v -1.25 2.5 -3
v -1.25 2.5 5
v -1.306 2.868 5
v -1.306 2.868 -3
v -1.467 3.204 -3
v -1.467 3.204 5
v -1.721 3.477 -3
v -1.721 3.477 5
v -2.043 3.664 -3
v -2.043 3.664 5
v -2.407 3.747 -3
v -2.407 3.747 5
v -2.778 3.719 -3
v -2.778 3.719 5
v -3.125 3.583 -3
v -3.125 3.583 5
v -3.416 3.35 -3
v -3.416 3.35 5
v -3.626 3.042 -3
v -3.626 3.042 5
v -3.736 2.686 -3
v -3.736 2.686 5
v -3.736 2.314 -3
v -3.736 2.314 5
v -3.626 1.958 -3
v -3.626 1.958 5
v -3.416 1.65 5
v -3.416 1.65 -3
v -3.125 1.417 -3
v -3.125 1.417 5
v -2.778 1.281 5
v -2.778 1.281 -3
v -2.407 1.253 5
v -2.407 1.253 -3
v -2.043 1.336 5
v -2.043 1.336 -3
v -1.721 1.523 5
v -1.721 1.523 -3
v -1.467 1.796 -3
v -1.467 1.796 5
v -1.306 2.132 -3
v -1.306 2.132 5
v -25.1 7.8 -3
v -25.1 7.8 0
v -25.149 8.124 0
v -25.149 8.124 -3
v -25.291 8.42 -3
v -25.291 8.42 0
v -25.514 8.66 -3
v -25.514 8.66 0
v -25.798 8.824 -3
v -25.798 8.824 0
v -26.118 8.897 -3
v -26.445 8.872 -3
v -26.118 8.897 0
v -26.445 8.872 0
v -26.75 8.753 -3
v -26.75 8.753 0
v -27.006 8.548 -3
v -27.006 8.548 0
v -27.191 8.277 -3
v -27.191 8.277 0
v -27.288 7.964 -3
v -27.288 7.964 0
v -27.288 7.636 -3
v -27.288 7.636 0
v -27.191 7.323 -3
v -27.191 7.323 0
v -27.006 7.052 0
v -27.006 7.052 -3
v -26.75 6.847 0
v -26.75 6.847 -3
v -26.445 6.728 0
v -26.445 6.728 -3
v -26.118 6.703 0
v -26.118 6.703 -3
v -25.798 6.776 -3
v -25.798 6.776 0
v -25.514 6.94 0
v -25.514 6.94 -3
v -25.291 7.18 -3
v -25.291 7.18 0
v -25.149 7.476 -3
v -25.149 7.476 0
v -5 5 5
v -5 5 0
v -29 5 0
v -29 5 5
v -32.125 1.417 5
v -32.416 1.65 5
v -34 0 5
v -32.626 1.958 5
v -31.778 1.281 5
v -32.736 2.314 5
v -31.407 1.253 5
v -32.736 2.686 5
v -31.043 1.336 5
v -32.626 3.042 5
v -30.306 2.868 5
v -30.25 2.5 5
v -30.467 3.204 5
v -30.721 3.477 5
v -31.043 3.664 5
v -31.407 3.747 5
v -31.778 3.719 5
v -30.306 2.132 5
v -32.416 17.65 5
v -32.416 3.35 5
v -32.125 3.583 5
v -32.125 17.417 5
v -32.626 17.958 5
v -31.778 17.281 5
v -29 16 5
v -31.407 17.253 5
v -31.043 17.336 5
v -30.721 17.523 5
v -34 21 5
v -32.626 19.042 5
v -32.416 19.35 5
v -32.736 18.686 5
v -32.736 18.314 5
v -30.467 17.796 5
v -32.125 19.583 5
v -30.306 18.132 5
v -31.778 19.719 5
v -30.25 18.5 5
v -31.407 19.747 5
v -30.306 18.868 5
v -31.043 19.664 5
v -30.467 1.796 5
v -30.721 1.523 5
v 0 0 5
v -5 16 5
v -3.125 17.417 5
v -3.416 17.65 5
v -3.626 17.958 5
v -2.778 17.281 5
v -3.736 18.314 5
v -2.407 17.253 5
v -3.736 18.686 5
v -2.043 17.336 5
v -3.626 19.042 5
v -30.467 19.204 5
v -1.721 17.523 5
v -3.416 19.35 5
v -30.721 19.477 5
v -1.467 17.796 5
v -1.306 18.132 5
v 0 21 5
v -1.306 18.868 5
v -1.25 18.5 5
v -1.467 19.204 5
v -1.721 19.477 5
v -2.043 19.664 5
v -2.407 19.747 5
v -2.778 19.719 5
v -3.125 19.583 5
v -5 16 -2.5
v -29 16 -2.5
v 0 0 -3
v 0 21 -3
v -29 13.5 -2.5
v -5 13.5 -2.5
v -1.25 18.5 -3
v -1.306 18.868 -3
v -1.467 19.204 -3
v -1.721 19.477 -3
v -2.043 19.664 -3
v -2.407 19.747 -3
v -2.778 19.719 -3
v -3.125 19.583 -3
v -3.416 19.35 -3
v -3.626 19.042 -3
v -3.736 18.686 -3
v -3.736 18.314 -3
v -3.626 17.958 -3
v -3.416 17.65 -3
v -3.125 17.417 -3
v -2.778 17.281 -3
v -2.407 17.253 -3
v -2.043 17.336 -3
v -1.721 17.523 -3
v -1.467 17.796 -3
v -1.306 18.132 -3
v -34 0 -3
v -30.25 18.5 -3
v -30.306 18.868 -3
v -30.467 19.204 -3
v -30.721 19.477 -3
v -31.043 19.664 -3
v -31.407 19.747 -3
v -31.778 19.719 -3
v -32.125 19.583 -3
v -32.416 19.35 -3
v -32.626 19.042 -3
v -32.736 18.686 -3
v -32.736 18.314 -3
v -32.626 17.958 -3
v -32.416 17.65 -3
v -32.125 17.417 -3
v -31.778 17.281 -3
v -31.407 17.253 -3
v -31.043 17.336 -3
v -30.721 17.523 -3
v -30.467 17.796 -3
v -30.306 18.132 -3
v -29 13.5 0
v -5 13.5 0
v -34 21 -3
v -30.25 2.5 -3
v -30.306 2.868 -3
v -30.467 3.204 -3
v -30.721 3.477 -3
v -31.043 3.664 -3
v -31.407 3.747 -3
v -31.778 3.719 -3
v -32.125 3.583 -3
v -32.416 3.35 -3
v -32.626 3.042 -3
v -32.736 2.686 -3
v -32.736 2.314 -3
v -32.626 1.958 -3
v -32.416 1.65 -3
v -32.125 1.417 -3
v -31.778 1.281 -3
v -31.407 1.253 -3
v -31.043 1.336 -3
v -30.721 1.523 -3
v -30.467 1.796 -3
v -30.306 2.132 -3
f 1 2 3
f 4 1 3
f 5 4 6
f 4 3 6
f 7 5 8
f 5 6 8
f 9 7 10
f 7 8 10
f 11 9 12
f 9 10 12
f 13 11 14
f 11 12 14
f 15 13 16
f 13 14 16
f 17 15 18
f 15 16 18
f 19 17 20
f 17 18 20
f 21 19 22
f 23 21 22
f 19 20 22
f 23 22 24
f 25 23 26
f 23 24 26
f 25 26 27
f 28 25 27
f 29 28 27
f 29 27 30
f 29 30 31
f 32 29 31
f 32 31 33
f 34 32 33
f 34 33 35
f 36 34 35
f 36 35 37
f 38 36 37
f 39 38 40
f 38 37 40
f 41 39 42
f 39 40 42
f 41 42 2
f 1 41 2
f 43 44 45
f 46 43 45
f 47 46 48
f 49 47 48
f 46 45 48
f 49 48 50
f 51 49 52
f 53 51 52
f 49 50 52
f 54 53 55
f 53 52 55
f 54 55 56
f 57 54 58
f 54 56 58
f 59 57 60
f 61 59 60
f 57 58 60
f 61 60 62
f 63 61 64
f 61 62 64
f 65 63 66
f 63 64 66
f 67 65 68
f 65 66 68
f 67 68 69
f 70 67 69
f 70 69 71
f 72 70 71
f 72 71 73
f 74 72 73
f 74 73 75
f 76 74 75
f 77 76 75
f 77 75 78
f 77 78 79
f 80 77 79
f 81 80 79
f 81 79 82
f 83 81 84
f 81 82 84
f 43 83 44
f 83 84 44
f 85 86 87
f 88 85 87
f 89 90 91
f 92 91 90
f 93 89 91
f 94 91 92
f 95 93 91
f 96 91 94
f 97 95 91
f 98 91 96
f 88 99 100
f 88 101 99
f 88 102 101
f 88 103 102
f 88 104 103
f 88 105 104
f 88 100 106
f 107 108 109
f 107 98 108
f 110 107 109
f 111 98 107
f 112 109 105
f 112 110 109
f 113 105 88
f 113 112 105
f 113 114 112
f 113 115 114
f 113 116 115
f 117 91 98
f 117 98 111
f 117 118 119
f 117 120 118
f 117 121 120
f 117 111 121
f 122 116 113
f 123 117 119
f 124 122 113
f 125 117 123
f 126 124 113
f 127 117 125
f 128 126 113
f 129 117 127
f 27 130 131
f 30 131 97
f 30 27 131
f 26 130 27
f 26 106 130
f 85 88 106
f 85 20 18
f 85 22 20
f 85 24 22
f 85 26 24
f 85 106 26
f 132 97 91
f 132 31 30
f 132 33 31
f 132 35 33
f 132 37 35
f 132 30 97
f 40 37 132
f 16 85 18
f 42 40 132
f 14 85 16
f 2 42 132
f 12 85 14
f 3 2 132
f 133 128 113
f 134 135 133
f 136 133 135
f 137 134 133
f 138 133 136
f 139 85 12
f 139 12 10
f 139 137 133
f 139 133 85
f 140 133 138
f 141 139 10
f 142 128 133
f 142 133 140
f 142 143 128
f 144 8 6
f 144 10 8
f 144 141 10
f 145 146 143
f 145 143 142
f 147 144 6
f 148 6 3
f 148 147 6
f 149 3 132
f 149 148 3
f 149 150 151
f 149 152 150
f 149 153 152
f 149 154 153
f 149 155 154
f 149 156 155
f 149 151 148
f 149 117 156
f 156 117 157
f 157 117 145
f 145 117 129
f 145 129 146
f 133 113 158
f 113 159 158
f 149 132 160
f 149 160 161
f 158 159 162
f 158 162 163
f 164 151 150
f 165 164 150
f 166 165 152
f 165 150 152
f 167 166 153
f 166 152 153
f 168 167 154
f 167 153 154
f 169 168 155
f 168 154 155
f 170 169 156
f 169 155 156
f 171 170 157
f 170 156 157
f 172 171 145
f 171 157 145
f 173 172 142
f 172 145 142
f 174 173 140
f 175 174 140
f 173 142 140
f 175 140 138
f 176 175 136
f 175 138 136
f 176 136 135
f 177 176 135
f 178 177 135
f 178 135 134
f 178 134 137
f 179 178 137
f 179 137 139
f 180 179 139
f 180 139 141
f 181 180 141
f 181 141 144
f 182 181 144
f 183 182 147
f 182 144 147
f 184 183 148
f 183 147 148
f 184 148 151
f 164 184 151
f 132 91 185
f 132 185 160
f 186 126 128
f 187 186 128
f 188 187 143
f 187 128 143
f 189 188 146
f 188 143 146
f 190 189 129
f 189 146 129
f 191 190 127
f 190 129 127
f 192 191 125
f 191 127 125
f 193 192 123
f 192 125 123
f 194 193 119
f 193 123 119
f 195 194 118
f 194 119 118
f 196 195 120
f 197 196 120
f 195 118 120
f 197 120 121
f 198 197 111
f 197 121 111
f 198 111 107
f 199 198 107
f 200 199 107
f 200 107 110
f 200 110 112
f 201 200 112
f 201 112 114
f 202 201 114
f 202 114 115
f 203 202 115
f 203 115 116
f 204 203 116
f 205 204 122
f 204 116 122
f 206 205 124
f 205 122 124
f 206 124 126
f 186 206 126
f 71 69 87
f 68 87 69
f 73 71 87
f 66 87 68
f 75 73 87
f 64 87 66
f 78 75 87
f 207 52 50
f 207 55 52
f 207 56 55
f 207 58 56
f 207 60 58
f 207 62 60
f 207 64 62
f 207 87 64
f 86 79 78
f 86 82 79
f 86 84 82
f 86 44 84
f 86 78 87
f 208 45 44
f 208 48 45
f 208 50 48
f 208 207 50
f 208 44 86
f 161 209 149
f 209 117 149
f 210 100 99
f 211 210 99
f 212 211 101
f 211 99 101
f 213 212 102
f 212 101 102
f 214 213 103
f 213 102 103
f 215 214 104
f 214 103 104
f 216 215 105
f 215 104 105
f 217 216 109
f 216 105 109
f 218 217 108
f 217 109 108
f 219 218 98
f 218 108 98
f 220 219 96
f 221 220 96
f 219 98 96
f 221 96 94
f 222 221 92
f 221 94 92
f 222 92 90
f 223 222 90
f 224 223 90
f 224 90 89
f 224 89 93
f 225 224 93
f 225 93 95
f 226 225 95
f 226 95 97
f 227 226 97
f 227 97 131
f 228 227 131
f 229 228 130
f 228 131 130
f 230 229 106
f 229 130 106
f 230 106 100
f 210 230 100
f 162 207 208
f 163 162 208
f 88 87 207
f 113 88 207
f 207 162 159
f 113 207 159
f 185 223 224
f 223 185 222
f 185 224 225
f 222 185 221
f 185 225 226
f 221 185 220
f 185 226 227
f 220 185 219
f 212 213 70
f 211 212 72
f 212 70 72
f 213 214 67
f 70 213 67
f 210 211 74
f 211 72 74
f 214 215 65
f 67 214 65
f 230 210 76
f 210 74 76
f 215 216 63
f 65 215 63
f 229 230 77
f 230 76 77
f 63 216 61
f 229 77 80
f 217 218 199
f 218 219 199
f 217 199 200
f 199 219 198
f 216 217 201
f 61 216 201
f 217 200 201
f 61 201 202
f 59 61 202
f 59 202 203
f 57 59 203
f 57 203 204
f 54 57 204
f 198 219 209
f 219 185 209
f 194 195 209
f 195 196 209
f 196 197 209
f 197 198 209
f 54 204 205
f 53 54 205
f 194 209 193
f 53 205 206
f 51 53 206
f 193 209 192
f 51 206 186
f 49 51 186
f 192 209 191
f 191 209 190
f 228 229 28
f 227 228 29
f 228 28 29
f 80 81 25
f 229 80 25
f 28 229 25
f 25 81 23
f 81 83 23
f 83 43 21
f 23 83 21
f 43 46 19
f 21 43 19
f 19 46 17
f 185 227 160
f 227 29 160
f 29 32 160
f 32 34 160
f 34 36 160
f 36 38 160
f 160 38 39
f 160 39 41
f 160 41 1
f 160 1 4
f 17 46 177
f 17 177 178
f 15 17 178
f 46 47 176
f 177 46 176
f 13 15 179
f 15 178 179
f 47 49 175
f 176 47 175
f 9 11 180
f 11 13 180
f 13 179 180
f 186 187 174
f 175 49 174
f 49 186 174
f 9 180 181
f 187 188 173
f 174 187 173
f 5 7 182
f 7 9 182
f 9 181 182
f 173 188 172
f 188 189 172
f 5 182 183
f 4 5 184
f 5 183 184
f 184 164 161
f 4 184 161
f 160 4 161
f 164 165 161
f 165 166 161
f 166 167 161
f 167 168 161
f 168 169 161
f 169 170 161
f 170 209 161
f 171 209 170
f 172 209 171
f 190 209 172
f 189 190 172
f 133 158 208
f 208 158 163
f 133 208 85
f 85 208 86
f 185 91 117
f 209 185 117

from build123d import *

# Parameters (mm, degrees)
F0_W     = 34
F0_H     = 21
F1_DEPTH = 5
F0_W_2   = 24
F0_H_2   = 8.5
F0_H_3   = 2.5
F2_DEPTH = 3
F3_DEPTH = 2.5
F4_R     = 1.1
F5_DEPTH = 3
F6_R     = 1.25
F7_DEPTH = 8


with BuildPart() as f1:
    # F0 (on Top) → F1 (new body)
    with BuildSketch(Plane.XY):
        with Locations((-17, 10.5)):
            Rectangle(F0_W, F0_H)
        Polygon((-29, 13.5), (-29, 16), (-5, 16), (-5, 13.5), (-5, 5), (-29, 5), align=None, mode=Mode.SUBTRACT)
    extrude(amount=F1_DEPTH)

    # F0 (on Top) → F2 (join)
    with BuildSketch(Plane.XY):
        with Locations((-17, 10.5)):
            Rectangle(F0_W, F0_H)
        Polygon((-29, 13.5), (-29, 16), (-5, 16), (-5, 13.5), (-5, 5), (-29, 5), align=None, mode=Mode.SUBTRACT)
        with Locations((-17, 9.25)):
            Rectangle(F0_W_2, F0_H_2)
        with Locations((-17, 14.75)):
            Rectangle(F0_W_2, F0_H_3)
    extrude(amount=-F2_DEPTH)

    # F0 (on Top) → F3 (cut)
    with BuildSketch(Plane.XY):
        with Locations((-17, 14.75)):
            Rectangle(F0_W_2, F0_H_3)
    extrude(amount=-F3_DEPTH, mode=Mode.SUBTRACT)

    # F4 (on face) → F5 (cut, through all)
    with BuildSketch(Plane.XY):
        with Locations((-26.2, 7.8)):
            Circle(F4_R)
    extrude(amount=-F5_DEPTH, mode=Mode.SUBTRACT)

    # F6 (on face) → F7 (cut, through all)
    with BuildSketch(Plane.XY.offset(5)):
        with Locations((-31.5, 18.5)):
            Circle(F6_R)
        with Locations((-2.5, 18.5)):
            Circle(F6_R)
        with Locations((-2.5, 2.5)):
            Circle(F6_R)
        with Locations((-31.5, 2.5)):
            Circle(F6_R)
    extrude(amount=-F7_DEPTH, mode=Mode.SUBTRACT)


solid = f1.part
